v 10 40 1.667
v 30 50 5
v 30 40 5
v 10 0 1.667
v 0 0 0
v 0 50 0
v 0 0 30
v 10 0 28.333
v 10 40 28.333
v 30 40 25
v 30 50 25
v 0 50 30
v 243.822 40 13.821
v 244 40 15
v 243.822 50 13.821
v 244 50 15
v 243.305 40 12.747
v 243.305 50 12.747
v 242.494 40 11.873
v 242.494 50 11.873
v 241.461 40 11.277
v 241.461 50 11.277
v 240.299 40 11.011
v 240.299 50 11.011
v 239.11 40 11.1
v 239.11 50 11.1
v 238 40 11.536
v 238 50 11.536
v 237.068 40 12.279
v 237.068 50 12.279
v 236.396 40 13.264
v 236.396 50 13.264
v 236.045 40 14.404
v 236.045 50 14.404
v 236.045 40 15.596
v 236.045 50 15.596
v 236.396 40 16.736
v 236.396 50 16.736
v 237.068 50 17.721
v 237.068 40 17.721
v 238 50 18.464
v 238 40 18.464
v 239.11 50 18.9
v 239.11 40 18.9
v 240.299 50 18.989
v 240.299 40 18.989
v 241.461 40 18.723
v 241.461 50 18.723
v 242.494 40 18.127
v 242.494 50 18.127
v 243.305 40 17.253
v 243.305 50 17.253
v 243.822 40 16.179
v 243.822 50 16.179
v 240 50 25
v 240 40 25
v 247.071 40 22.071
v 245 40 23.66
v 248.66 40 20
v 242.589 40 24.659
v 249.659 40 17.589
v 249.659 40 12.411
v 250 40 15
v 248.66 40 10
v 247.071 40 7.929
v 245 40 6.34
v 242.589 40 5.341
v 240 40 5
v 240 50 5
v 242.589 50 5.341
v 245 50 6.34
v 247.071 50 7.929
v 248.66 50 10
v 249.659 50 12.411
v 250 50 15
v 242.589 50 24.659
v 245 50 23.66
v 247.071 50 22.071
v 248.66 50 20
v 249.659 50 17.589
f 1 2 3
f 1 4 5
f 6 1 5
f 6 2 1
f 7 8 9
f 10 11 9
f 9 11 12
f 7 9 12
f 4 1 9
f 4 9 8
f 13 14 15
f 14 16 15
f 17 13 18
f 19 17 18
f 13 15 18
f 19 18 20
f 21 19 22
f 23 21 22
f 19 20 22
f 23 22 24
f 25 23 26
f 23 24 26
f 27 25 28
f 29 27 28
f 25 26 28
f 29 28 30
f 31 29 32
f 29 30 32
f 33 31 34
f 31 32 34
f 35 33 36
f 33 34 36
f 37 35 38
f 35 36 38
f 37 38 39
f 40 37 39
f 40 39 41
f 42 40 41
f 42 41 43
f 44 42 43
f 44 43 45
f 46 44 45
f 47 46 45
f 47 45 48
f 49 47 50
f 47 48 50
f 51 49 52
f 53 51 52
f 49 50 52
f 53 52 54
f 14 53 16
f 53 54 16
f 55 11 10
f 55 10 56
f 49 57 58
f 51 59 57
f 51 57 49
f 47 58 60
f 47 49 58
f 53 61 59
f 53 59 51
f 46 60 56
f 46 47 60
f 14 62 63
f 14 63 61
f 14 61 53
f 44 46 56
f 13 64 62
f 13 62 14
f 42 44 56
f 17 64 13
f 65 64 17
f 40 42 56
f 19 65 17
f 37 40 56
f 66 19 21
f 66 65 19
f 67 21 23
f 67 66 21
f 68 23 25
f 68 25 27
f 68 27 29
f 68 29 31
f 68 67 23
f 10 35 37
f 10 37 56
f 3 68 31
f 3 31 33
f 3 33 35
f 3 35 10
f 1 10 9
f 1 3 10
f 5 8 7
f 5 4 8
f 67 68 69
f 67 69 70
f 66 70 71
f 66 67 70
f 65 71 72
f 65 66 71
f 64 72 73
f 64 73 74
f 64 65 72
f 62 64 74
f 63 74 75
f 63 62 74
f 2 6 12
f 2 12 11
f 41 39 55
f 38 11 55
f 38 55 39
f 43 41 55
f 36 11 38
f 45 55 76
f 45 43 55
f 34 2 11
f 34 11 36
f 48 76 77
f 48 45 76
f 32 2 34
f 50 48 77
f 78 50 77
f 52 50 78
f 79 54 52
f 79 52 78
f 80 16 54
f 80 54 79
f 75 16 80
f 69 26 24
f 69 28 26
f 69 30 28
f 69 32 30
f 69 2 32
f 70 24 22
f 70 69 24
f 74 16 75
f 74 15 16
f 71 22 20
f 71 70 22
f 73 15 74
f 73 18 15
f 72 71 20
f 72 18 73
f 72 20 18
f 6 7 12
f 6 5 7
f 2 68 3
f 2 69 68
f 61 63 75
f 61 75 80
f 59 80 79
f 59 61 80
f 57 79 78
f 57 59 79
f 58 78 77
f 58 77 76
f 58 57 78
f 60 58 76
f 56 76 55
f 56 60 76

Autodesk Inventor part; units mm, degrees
ref_plane "YZ Plane" through (0, 0, 0) normal (1, 0, 0) x (0, 1, 0)
ref_plane "XZ Plane" through (0, 0, 0) normal (0, 1, 0) x (-1, 0, 0)
ref_plane "XY Plane" through (0, 0, 0) normal (0, 0, 1) x (1, 0, 0)
sketch "Schizzo1" plane through (0, 0, 0) normal (0, 0, 1) x (1, 0, 0)
  line L0 (0, 0) -> (0, 50)
  line L1 (0, 50) -> (250, 50)
  line L2 (250, 50) -> (250, 40)
  line L3 (250, 40) -> (10, 40)
  line L4 (10, 40) -> (10, 0)
  line L5 (10, 0) -> (0, 0)
  dimension "d0" = 10
  dimension "d1" = 10
  dimension "d2" = 50
  dimension "d3" = 250
extrude "Estrusione1" add sketch "Schizzo1" along normal blind 30
sketch "Schizzo2" plane through (0, 50, 0) normal (0, 1, 0) x (1, 0, 0)
  circle A0 centre (240, -15) radius 4
  line L0 (250, -30) -> (0, -30) projected
  line L1 (250, 0) -> (250, -30) projected
  line L2 (30, 51) -> (328, 51)
  line L3 (328, 51) -> (328, -5)
  line L4 (328, -5) -> (30, -5)
  line L5 (30, 0) -> (30, 51)
  line L6 (336, -124) -> (30, -124)
  line L7 (30, -124) -> (30, -30)
  line L8 (30, -25) -> (336, -25)
  line L9 (336, -25) -> (336, -124)
  line L10 (250, 0) -> (0, 0) projected
  line L11 (0, 0) -> (0, -30) projected
  line L12 (30, -5) -> (0, 0)
  line L13 (30, -25) -> (0, -30)
  line L14 (0, 0) -> (328, 124)
  line L15 (328, 124) -> (336, -220)
  line L16 (336, -220) -> (0, -30)
  point P0 (250, -5)
  point P1 (250, -25)
  dimension "d6" = 8
  dimension "d7" = 15
  dimension "d8" = 10
  dimension "d9" = 5
  dimension "d10" = 5
  dimension "d11" = 30
extrude "Estrusione2" cut sketch "Schizzo2" against normal blind 50 contours A0 | L0 L13 L8 L1 | L4 L12 L10 L1
fillet "Raccordo1" radius 10 2 edges at (250, 45, 5) (250, 45, 25)
properties part number "porta penna"
